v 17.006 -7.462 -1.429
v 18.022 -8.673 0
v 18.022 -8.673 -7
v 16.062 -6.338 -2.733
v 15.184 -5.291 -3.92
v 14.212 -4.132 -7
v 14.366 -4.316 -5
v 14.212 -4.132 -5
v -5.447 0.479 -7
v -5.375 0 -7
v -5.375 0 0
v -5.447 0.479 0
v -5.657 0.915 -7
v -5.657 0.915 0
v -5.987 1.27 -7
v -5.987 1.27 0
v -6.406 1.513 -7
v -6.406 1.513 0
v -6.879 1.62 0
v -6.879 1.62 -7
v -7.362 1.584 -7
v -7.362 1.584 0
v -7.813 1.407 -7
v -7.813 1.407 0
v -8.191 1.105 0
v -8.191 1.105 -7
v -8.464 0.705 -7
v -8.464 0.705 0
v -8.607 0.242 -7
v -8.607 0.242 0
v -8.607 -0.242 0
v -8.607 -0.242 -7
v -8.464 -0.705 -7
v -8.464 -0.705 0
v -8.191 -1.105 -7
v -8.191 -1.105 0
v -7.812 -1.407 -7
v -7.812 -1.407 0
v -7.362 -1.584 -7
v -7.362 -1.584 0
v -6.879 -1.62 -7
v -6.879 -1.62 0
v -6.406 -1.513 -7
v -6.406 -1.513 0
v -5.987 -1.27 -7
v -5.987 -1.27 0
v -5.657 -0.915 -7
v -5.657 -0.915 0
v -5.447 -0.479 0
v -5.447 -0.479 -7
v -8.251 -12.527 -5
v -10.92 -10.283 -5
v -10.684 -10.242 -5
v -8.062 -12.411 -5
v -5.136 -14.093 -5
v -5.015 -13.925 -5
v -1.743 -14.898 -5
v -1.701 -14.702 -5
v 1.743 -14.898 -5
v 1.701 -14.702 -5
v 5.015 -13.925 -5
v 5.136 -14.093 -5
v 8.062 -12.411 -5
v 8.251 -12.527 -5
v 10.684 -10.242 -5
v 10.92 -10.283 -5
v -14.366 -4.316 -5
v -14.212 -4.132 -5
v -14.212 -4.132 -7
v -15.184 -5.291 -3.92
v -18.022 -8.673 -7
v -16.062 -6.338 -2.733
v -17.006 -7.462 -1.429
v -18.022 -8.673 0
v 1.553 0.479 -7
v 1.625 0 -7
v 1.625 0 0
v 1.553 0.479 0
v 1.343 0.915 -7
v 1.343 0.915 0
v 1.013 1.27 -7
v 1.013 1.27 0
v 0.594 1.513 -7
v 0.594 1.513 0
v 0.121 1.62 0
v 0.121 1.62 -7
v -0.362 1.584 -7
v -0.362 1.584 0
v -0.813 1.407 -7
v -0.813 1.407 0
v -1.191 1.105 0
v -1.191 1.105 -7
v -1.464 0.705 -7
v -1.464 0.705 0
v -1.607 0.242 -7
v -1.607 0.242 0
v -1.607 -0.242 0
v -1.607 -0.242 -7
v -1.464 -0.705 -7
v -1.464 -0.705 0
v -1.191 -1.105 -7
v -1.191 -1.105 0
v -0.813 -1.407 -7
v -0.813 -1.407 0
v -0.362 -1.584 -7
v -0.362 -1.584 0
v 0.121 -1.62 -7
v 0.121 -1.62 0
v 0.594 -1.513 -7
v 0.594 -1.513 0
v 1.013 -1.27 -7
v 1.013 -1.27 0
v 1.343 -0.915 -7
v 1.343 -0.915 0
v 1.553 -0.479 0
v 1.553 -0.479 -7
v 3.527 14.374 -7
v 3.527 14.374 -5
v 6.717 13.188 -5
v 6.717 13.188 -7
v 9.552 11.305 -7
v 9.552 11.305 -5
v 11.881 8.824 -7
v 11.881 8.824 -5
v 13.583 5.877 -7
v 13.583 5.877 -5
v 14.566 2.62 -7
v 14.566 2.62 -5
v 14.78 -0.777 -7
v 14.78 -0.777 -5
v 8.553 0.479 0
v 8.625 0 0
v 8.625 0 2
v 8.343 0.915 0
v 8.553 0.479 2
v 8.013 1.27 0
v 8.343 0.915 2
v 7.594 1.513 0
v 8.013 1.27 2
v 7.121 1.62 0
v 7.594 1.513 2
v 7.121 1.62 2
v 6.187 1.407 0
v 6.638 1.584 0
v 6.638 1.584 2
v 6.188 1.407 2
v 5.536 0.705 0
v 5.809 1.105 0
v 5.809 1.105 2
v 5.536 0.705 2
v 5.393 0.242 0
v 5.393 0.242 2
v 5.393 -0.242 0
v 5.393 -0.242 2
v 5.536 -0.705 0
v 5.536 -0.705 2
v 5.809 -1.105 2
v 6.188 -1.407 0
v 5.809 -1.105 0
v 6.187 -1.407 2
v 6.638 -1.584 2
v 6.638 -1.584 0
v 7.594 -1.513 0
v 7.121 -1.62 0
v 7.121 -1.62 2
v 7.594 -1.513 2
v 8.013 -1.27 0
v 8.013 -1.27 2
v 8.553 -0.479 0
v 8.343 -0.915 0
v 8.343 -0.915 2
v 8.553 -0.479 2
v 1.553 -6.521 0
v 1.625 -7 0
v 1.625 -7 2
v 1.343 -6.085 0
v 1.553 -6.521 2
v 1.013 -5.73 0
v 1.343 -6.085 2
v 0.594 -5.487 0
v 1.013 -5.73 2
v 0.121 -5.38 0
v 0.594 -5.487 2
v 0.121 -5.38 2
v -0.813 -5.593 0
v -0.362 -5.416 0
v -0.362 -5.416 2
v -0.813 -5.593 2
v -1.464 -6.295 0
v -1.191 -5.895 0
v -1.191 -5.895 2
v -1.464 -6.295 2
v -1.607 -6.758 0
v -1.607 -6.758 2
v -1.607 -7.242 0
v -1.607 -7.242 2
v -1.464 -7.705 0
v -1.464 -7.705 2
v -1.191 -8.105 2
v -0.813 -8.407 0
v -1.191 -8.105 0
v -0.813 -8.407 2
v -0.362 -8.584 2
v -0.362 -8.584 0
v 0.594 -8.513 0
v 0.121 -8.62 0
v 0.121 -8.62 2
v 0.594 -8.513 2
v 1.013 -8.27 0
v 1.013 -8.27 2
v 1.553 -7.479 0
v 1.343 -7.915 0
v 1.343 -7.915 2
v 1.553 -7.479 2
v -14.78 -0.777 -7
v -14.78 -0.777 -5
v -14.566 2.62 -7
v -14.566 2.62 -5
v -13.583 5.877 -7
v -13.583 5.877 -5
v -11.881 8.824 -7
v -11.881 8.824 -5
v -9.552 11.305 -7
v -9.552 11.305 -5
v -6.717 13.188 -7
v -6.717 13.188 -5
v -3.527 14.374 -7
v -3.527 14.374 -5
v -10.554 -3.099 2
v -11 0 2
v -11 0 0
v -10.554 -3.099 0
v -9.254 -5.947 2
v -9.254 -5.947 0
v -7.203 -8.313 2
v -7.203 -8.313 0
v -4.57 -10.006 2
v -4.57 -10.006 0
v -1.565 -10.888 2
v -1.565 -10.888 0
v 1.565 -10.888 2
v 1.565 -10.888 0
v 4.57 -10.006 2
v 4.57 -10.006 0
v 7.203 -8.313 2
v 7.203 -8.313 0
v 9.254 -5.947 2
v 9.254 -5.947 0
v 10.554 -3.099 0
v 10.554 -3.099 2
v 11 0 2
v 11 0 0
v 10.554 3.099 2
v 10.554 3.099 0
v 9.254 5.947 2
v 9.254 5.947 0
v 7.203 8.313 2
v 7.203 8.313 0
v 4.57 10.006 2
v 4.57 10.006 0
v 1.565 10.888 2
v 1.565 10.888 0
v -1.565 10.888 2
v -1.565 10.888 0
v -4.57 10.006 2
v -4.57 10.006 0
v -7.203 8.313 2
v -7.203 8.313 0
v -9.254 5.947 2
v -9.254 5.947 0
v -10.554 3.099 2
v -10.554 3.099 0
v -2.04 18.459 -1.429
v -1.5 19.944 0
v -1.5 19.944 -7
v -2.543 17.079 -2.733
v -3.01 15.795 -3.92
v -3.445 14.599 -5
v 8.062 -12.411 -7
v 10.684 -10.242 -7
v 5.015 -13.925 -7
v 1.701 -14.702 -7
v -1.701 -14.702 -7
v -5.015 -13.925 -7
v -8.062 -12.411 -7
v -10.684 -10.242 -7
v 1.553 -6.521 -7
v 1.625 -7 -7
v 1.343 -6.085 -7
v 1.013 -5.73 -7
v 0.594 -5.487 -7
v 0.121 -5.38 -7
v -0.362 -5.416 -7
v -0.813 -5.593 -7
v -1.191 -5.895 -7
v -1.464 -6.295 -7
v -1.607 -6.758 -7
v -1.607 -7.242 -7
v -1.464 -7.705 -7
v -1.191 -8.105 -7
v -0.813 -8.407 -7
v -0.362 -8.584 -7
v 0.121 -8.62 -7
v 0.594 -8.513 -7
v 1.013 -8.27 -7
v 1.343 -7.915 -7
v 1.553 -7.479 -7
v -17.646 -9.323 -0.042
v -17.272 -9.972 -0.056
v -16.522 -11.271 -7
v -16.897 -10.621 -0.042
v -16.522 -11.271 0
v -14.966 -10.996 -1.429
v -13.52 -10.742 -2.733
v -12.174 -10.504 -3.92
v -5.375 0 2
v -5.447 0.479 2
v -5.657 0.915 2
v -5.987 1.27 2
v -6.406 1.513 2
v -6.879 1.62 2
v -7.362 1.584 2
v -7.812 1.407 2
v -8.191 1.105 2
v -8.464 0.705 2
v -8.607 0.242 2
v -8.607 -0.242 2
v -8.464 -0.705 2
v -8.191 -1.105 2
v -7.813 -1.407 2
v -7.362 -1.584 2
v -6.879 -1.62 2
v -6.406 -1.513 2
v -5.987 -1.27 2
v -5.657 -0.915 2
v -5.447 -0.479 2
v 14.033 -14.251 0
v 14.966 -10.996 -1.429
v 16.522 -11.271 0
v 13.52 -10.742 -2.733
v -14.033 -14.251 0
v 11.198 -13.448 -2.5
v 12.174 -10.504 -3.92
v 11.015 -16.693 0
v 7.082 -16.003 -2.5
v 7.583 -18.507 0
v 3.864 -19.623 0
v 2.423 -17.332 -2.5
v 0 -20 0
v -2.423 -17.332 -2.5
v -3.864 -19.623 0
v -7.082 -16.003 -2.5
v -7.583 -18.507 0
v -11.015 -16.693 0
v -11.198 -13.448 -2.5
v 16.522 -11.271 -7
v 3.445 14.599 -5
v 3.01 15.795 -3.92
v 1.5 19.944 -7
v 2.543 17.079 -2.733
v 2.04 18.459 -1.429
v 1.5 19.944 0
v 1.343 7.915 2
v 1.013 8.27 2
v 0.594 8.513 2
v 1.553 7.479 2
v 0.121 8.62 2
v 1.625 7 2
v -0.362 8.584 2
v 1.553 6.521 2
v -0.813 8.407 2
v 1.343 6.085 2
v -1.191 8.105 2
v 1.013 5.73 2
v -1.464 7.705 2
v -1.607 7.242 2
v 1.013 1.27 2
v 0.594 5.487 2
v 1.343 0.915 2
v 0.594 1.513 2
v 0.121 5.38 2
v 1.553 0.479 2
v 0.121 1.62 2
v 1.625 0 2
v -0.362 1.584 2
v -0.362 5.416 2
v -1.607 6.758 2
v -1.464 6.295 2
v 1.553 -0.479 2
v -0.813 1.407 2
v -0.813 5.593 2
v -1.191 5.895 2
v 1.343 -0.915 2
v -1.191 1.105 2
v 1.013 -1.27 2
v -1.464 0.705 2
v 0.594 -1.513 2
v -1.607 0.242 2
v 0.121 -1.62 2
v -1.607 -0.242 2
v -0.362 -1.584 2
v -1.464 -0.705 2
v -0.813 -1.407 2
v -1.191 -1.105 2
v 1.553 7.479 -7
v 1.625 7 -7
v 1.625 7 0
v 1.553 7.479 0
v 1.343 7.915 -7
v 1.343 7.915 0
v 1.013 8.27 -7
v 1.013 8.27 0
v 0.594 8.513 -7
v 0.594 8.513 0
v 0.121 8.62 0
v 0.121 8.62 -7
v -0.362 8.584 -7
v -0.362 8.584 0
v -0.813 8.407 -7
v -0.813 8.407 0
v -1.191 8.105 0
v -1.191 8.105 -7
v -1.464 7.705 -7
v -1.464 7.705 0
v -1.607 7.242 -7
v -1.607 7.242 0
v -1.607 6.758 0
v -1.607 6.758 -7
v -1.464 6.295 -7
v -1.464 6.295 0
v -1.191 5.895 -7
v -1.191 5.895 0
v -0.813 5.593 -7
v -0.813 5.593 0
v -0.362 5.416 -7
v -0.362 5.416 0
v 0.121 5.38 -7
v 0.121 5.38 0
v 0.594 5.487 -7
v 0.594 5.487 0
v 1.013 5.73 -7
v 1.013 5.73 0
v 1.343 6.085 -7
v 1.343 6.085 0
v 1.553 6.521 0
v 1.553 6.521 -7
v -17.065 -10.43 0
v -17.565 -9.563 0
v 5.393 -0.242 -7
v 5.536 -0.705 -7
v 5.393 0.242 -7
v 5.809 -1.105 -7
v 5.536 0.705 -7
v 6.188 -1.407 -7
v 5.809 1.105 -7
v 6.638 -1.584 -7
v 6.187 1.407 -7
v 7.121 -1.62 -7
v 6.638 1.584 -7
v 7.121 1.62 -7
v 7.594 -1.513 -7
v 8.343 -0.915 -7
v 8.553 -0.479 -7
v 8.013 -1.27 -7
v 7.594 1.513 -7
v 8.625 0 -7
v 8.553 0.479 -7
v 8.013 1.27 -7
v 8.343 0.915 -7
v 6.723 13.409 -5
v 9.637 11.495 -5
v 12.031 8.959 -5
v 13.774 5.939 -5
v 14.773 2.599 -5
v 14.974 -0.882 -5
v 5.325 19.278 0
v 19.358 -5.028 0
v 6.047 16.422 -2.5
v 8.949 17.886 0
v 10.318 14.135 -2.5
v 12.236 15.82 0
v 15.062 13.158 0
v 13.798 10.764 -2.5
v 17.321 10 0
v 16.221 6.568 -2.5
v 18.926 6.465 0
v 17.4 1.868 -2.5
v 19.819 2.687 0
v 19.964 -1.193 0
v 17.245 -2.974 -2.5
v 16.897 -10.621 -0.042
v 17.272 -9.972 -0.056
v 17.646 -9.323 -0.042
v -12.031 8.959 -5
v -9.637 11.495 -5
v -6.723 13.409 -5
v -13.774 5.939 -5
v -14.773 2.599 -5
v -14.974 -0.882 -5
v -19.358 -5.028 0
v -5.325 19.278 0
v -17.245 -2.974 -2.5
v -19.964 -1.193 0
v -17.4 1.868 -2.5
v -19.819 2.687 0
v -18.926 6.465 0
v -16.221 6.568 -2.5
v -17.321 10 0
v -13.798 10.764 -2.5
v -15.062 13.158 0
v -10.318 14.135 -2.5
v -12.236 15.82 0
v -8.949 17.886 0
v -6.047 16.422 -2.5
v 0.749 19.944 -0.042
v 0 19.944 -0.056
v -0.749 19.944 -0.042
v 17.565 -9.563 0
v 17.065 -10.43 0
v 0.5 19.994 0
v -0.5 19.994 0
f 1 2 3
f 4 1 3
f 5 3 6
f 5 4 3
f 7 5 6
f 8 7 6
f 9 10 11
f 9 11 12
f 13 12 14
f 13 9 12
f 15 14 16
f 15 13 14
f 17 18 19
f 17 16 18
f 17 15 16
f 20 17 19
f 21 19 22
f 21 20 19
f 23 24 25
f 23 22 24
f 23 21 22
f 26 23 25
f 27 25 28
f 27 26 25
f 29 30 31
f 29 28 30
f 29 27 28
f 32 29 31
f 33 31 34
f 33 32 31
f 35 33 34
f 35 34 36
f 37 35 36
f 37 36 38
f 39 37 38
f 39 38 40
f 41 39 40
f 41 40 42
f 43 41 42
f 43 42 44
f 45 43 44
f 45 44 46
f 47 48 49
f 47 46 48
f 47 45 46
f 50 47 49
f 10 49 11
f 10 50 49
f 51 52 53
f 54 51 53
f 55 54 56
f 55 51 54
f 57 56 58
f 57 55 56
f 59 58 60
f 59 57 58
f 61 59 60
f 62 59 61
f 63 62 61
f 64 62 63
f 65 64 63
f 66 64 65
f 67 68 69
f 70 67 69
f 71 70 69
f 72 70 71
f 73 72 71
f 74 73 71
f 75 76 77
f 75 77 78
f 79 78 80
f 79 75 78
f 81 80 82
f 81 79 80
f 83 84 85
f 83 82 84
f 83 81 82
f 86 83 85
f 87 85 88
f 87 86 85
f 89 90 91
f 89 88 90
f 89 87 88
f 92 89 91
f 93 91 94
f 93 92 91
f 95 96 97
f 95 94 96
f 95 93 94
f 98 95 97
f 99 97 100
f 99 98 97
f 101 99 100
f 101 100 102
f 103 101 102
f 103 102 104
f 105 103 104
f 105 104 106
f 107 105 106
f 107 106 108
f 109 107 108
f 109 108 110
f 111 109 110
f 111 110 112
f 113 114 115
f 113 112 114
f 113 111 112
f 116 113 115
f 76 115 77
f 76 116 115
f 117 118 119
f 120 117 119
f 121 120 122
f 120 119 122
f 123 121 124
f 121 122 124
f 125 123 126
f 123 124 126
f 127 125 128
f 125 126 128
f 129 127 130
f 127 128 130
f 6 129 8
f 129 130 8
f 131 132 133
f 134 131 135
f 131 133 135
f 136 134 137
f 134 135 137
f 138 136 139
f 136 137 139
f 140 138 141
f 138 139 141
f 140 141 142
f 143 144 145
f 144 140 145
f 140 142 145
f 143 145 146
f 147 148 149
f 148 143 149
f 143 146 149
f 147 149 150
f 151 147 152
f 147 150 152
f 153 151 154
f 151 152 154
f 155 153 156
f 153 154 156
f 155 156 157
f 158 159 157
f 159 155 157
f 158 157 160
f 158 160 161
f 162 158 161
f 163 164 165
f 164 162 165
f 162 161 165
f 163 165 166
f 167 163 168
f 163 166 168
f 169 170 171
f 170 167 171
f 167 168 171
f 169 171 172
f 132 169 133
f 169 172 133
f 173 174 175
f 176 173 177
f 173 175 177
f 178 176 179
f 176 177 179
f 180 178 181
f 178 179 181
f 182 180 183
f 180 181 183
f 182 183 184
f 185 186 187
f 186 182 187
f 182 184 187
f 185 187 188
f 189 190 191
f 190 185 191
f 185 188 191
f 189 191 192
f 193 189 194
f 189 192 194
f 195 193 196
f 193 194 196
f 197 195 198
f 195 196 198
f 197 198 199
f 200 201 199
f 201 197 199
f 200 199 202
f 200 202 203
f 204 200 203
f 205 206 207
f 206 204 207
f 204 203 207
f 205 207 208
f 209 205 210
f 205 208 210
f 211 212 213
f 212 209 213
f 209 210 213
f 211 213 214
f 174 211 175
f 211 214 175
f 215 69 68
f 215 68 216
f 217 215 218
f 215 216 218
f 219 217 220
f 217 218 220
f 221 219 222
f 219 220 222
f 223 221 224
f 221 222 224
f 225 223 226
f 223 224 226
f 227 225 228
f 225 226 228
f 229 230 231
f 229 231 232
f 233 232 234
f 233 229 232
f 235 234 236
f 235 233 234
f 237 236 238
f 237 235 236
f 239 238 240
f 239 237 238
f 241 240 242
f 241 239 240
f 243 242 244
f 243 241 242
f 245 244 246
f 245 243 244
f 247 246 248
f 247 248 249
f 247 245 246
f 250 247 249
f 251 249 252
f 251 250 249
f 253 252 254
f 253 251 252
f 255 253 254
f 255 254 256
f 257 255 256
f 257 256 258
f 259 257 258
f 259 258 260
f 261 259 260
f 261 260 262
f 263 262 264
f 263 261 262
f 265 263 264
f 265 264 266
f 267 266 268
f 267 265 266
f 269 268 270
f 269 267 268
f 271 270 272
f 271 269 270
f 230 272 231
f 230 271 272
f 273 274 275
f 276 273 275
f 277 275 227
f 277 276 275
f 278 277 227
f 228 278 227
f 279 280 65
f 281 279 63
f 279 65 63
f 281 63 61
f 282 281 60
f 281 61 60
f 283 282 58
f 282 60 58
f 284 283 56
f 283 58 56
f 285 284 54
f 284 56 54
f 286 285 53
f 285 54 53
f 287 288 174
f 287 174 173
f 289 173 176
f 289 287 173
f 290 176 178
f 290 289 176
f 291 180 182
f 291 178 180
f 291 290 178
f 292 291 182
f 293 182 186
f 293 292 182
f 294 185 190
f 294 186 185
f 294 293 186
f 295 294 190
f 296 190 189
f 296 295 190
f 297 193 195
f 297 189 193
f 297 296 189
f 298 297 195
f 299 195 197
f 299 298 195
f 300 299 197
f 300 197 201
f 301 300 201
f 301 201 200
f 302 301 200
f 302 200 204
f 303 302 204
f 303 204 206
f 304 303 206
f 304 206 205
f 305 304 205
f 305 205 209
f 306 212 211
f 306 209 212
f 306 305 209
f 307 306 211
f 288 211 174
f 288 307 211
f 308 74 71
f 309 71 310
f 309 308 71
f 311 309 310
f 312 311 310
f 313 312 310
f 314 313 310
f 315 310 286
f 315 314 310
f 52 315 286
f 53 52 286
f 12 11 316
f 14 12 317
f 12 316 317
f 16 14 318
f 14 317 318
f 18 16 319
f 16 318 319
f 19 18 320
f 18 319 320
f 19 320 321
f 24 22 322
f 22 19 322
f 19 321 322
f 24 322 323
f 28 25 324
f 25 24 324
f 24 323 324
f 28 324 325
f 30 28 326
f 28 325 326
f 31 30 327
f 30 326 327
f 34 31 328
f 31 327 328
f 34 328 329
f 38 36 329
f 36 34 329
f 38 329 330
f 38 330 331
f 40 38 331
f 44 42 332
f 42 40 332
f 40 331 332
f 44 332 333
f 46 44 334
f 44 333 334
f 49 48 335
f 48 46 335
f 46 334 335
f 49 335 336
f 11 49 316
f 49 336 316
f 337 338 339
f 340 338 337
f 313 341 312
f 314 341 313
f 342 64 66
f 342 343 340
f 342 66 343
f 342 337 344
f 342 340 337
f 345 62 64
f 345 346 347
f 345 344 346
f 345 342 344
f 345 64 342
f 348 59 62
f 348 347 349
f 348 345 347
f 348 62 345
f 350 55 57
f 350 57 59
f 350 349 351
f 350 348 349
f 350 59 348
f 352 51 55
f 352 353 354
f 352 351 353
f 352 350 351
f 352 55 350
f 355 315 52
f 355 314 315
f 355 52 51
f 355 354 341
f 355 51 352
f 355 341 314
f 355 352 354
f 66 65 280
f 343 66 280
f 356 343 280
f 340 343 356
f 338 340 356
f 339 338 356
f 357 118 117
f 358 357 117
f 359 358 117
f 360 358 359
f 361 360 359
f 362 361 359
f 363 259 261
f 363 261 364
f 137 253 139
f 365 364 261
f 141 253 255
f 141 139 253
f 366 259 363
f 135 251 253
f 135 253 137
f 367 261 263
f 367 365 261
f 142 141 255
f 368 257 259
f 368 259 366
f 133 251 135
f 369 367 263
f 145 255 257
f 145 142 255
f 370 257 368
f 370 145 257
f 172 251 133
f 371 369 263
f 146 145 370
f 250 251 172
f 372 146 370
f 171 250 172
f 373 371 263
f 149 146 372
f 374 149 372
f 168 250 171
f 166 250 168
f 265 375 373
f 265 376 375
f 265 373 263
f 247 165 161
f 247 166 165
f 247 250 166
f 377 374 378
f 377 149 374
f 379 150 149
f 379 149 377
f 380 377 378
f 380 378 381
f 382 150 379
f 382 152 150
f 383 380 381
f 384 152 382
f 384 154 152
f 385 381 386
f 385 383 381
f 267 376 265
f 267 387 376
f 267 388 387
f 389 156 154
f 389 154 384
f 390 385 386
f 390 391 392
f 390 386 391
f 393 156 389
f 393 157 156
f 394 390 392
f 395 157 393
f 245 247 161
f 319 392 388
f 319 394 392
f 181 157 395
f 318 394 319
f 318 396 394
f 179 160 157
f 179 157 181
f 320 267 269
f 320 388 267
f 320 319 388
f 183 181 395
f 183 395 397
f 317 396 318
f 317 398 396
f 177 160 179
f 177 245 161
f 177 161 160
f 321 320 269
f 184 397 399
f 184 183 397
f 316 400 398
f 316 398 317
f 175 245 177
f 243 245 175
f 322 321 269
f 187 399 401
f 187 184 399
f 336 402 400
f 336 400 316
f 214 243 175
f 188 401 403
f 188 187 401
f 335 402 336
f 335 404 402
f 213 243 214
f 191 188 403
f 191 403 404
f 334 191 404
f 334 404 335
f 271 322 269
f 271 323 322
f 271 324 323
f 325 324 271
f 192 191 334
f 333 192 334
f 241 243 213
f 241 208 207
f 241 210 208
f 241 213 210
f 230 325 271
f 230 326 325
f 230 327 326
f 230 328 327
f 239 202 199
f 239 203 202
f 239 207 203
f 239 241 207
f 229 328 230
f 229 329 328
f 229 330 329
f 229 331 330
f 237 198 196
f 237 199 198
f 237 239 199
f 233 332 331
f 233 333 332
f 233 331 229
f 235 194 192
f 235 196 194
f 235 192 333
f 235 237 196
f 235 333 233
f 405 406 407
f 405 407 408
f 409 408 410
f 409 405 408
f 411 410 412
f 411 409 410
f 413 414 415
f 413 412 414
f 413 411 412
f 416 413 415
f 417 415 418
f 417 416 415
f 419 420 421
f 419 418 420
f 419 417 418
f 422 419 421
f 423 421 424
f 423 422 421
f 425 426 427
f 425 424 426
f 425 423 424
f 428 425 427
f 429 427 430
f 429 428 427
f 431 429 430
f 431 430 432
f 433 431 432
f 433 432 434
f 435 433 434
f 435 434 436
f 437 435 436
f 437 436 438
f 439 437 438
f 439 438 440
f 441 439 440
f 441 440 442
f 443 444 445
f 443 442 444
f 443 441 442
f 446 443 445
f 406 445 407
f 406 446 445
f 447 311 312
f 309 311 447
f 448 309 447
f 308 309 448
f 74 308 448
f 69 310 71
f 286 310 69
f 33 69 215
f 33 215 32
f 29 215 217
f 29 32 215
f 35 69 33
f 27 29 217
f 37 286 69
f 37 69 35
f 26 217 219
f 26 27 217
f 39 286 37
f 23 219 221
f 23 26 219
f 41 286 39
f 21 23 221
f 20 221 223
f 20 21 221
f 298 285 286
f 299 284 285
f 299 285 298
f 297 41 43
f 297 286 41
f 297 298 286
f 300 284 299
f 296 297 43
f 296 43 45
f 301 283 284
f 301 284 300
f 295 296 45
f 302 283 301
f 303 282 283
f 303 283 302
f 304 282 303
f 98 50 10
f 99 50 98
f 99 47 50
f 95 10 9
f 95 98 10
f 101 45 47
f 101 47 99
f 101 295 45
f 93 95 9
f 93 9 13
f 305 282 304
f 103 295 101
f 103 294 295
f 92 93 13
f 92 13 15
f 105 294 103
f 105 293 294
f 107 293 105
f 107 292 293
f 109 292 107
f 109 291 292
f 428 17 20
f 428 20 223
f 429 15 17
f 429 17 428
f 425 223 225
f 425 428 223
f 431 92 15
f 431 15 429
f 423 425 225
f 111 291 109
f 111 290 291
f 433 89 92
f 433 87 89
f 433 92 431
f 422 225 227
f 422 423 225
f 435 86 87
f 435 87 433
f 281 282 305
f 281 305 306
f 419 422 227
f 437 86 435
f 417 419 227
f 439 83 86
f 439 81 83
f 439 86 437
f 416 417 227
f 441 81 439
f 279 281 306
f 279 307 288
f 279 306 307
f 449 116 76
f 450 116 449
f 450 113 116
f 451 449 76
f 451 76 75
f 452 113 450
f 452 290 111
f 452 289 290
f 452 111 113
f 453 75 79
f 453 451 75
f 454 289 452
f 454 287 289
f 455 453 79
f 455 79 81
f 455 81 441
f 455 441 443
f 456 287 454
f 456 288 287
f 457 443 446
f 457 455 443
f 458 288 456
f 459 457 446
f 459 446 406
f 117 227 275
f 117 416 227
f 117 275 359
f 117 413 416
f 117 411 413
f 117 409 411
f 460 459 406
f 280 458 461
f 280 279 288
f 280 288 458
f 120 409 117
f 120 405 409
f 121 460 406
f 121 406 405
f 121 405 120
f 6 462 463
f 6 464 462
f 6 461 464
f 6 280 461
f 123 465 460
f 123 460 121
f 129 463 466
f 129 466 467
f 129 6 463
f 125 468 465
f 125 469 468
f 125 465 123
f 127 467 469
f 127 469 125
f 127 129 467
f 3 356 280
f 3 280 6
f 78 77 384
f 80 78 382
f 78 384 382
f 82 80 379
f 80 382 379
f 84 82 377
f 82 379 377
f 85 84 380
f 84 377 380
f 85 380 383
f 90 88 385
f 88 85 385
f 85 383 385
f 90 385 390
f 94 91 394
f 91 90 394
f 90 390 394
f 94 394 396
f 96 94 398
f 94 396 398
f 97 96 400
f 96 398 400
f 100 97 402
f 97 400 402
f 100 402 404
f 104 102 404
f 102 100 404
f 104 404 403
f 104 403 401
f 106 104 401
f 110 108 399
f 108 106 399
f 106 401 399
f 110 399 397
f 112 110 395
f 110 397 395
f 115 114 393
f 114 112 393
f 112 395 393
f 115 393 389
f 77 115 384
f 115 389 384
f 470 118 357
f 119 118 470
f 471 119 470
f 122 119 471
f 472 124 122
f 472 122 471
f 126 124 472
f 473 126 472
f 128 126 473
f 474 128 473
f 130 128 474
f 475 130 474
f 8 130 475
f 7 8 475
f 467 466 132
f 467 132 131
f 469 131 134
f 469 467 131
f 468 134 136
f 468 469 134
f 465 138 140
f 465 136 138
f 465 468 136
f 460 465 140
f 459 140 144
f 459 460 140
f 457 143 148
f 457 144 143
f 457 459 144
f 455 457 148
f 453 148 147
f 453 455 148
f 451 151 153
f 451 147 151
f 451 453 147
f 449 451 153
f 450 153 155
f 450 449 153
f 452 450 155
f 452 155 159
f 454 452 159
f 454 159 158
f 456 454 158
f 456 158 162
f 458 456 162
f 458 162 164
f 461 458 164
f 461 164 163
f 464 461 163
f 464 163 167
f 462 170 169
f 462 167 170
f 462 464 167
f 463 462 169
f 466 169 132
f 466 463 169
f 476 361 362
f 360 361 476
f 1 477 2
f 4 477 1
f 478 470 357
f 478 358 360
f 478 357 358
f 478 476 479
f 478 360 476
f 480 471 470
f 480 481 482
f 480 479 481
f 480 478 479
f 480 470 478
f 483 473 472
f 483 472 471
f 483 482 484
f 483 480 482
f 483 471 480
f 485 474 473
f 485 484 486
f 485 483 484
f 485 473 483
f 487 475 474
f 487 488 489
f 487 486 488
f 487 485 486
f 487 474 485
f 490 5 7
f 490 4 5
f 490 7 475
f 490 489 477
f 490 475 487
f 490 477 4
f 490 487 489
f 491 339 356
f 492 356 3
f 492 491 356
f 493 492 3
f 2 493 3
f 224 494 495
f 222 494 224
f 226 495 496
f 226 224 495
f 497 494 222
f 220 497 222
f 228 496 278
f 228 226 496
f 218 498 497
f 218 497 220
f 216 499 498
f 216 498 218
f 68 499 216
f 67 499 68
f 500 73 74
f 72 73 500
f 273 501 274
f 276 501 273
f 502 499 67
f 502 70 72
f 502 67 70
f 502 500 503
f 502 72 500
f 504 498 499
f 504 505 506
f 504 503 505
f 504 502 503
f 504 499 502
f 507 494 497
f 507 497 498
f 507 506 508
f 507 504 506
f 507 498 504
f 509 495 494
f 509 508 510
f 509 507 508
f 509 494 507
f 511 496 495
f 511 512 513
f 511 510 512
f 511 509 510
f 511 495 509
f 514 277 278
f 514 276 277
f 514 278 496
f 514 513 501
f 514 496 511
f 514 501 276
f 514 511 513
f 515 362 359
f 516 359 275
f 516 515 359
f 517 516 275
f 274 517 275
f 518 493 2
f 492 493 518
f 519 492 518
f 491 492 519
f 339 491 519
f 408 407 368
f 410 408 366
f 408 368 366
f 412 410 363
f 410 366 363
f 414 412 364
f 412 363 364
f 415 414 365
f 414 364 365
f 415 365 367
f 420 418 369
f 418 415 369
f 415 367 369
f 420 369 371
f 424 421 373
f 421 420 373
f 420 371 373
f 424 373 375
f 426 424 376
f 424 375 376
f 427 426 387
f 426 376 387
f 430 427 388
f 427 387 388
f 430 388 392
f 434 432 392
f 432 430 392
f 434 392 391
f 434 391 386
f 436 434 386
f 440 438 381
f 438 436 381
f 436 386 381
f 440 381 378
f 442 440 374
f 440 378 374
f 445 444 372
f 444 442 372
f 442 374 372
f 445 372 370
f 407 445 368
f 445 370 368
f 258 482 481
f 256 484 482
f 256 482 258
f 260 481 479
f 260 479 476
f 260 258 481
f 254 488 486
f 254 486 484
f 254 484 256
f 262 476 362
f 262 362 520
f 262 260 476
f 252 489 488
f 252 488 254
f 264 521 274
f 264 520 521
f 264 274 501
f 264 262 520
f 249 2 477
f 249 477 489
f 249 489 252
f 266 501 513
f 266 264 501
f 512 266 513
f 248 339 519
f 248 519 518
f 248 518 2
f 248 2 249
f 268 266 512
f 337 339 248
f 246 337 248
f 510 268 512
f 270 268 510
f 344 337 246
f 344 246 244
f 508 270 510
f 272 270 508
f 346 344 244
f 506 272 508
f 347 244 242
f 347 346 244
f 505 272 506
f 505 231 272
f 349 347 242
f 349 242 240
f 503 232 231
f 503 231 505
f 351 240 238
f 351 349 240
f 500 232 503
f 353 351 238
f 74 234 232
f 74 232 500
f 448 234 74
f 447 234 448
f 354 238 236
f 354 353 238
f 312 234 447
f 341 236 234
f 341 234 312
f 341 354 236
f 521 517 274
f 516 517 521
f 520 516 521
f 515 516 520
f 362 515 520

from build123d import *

# Parameters (mm, degrees)
ESQUISSE3_R                  = 14.8
BOSS_EXTRU_1_DEPTH           = 2
BOSS_EXTRU_2_REACH           = 31.138
R_P_TITION_CIRCULAIRE1_COUNT = 3
ENL_V_MAT_EXTRU_1_DEPTH      = 30.137604569
ENL_V_MAT_EXTRU_1_DEPTH_BACK = 30.137604569
ESQUISSE5_R                  = 1.625
BOSS_EXTRU_3_START           = 2
ESQUISSE6_R                  = 11
ESQUISSE6_R_2                = 1.625
BOSS_EXTRU_3_DEPTH           = 2


with BuildPart() as part:
    # Esquisse2 → Révolution1 (revolve)
    with BuildSketch(Plane(origin=(0, 0, 0), x_dir=(0, 0, -1), z_dir=(1, 0, 0)), mode=Mode.PRIVATE) as r_volution1_sk:
        Polygon((0, 0), (0, 20), (5, 15), (5, 0), align=None)
    revolve(r_volution1_sk.sketch.rotate(Axis((0, 0, 0), (0, 0, -1)), 90), axis=Axis((0, 0, 0), (0, 0, -1)))

    # Esquisse3 → Boss.-Extru.1 (add)
    with BuildSketch(Plane(origin=(0, 0, -5), x_dir=(-1, 0, 0), z_dir=(0, 0, -1))):
        Circle(ESQUISSE3_R)
    extrude(amount=BOSS_EXTRU_1_DEPTH)

    # Boss.-Extru.2: up to this face of the body (flat: up to its plane)
    boss_extru_2_end = Plane(part.part.faces().sort_by_distance((0, 0, -7))[0])
    # Esquisse4 → Boss.-Extru.2 (add, up to the picked face)
    with BuildSketch(Plane.XY, mode=Mode.PRIVATE) as boss_extru_2_sk1:
        with BuildLine():
            Line((1.5, 19.943670675), (-1.5, 19.943670675))
            Line((-1.5, 19.943670675), (-3.52737474, 14.373504355))
            ThreePointArc((-3.52737474, 14.373504355), (0, 14.8), (3.52737474, 14.373504355))
            Line((3.52737474, 14.373504355), (1.5, 19.943670675))
        make_face()
    boss_extru_2_tool1 = split(extrude(boss_extru_2_sk1.sketch, amount=-BOSS_EXTRU_2_REACH, mode=Mode.PRIVATE), bisect_by=boss_extru_2_end, keep=Keep.BOTH, mode=Mode.PRIVATE)
    boss_extru_2 = boss_extru_2_tool1.solids().sort_by(Axis((0, 16.957577, 0), (0, 0, -1)))[0]
    add(boss_extru_2)

    # Répétition circulaire1: Boss.-Extru.2 ×3 about axis
    r_p_tition_circulaire1_axis = Axis((0, 0, 0), (0, 0, 1))
    for i in range(1, R_P_TITION_CIRCULAIRE1_COUNT):
        add(boss_extru_2.rotate(r_p_tition_circulaire1_axis, i * 360 / R_P_TITION_CIRCULAIRE1_COUNT))

    # Esquisse5 → Enlèv. mat.-Extru.1 (cut, two sides: drawn at the far end of the back side and taken through both)
    with BuildSketch(Plane.XY.offset(-ENL_V_MAT_EXTRU_1_DEPTH_BACK)):
        with Locations((0, 7)):
            Circle(ESQUISSE5_R)
        Circle(ESQUISSE5_R)
        with Locations((7, 0)):
            Circle(ESQUISSE5_R)
        with Locations((0, -7)):
            Circle(ESQUISSE5_R)
        with Locations((-7, 0)):
            Circle(ESQUISSE5_R)
    extrude(amount=ENL_V_MAT_EXTRU_1_DEPTH + ENL_V_MAT_EXTRU_1_DEPTH_BACK, mode=Mode.SUBTRACT)

    # Esquisse6 → Boss.-Extru.3 (add)
    with BuildSketch(Plane.XY.offset(BOSS_EXTRU_3_START)):
        with Locations(Location((0, 0, 0), (0, 0, 180))):
            Circle(ESQUISSE6_R)
        with Locations((0, 7)):
            Circle(ESQUISSE6_R_2, mode=Mode.SUBTRACT)
        with Locations((0, -7)):
            Circle(ESQUISSE6_R_2, mode=Mode.SUBTRACT)
        Circle(ESQUISSE6_R_2, mode=Mode.SUBTRACT)
        with Locations((7, 0)):
            Circle(ESQUISSE6_R_2, mode=Mode.SUBTRACT)
        with Locations((-7, 0)):
            Circle(ESQUISSE6_R_2, mode=Mode.SUBTRACT)
    extrude(amount=-BOSS_EXTRU_3_DEPTH)


solid = part.part
